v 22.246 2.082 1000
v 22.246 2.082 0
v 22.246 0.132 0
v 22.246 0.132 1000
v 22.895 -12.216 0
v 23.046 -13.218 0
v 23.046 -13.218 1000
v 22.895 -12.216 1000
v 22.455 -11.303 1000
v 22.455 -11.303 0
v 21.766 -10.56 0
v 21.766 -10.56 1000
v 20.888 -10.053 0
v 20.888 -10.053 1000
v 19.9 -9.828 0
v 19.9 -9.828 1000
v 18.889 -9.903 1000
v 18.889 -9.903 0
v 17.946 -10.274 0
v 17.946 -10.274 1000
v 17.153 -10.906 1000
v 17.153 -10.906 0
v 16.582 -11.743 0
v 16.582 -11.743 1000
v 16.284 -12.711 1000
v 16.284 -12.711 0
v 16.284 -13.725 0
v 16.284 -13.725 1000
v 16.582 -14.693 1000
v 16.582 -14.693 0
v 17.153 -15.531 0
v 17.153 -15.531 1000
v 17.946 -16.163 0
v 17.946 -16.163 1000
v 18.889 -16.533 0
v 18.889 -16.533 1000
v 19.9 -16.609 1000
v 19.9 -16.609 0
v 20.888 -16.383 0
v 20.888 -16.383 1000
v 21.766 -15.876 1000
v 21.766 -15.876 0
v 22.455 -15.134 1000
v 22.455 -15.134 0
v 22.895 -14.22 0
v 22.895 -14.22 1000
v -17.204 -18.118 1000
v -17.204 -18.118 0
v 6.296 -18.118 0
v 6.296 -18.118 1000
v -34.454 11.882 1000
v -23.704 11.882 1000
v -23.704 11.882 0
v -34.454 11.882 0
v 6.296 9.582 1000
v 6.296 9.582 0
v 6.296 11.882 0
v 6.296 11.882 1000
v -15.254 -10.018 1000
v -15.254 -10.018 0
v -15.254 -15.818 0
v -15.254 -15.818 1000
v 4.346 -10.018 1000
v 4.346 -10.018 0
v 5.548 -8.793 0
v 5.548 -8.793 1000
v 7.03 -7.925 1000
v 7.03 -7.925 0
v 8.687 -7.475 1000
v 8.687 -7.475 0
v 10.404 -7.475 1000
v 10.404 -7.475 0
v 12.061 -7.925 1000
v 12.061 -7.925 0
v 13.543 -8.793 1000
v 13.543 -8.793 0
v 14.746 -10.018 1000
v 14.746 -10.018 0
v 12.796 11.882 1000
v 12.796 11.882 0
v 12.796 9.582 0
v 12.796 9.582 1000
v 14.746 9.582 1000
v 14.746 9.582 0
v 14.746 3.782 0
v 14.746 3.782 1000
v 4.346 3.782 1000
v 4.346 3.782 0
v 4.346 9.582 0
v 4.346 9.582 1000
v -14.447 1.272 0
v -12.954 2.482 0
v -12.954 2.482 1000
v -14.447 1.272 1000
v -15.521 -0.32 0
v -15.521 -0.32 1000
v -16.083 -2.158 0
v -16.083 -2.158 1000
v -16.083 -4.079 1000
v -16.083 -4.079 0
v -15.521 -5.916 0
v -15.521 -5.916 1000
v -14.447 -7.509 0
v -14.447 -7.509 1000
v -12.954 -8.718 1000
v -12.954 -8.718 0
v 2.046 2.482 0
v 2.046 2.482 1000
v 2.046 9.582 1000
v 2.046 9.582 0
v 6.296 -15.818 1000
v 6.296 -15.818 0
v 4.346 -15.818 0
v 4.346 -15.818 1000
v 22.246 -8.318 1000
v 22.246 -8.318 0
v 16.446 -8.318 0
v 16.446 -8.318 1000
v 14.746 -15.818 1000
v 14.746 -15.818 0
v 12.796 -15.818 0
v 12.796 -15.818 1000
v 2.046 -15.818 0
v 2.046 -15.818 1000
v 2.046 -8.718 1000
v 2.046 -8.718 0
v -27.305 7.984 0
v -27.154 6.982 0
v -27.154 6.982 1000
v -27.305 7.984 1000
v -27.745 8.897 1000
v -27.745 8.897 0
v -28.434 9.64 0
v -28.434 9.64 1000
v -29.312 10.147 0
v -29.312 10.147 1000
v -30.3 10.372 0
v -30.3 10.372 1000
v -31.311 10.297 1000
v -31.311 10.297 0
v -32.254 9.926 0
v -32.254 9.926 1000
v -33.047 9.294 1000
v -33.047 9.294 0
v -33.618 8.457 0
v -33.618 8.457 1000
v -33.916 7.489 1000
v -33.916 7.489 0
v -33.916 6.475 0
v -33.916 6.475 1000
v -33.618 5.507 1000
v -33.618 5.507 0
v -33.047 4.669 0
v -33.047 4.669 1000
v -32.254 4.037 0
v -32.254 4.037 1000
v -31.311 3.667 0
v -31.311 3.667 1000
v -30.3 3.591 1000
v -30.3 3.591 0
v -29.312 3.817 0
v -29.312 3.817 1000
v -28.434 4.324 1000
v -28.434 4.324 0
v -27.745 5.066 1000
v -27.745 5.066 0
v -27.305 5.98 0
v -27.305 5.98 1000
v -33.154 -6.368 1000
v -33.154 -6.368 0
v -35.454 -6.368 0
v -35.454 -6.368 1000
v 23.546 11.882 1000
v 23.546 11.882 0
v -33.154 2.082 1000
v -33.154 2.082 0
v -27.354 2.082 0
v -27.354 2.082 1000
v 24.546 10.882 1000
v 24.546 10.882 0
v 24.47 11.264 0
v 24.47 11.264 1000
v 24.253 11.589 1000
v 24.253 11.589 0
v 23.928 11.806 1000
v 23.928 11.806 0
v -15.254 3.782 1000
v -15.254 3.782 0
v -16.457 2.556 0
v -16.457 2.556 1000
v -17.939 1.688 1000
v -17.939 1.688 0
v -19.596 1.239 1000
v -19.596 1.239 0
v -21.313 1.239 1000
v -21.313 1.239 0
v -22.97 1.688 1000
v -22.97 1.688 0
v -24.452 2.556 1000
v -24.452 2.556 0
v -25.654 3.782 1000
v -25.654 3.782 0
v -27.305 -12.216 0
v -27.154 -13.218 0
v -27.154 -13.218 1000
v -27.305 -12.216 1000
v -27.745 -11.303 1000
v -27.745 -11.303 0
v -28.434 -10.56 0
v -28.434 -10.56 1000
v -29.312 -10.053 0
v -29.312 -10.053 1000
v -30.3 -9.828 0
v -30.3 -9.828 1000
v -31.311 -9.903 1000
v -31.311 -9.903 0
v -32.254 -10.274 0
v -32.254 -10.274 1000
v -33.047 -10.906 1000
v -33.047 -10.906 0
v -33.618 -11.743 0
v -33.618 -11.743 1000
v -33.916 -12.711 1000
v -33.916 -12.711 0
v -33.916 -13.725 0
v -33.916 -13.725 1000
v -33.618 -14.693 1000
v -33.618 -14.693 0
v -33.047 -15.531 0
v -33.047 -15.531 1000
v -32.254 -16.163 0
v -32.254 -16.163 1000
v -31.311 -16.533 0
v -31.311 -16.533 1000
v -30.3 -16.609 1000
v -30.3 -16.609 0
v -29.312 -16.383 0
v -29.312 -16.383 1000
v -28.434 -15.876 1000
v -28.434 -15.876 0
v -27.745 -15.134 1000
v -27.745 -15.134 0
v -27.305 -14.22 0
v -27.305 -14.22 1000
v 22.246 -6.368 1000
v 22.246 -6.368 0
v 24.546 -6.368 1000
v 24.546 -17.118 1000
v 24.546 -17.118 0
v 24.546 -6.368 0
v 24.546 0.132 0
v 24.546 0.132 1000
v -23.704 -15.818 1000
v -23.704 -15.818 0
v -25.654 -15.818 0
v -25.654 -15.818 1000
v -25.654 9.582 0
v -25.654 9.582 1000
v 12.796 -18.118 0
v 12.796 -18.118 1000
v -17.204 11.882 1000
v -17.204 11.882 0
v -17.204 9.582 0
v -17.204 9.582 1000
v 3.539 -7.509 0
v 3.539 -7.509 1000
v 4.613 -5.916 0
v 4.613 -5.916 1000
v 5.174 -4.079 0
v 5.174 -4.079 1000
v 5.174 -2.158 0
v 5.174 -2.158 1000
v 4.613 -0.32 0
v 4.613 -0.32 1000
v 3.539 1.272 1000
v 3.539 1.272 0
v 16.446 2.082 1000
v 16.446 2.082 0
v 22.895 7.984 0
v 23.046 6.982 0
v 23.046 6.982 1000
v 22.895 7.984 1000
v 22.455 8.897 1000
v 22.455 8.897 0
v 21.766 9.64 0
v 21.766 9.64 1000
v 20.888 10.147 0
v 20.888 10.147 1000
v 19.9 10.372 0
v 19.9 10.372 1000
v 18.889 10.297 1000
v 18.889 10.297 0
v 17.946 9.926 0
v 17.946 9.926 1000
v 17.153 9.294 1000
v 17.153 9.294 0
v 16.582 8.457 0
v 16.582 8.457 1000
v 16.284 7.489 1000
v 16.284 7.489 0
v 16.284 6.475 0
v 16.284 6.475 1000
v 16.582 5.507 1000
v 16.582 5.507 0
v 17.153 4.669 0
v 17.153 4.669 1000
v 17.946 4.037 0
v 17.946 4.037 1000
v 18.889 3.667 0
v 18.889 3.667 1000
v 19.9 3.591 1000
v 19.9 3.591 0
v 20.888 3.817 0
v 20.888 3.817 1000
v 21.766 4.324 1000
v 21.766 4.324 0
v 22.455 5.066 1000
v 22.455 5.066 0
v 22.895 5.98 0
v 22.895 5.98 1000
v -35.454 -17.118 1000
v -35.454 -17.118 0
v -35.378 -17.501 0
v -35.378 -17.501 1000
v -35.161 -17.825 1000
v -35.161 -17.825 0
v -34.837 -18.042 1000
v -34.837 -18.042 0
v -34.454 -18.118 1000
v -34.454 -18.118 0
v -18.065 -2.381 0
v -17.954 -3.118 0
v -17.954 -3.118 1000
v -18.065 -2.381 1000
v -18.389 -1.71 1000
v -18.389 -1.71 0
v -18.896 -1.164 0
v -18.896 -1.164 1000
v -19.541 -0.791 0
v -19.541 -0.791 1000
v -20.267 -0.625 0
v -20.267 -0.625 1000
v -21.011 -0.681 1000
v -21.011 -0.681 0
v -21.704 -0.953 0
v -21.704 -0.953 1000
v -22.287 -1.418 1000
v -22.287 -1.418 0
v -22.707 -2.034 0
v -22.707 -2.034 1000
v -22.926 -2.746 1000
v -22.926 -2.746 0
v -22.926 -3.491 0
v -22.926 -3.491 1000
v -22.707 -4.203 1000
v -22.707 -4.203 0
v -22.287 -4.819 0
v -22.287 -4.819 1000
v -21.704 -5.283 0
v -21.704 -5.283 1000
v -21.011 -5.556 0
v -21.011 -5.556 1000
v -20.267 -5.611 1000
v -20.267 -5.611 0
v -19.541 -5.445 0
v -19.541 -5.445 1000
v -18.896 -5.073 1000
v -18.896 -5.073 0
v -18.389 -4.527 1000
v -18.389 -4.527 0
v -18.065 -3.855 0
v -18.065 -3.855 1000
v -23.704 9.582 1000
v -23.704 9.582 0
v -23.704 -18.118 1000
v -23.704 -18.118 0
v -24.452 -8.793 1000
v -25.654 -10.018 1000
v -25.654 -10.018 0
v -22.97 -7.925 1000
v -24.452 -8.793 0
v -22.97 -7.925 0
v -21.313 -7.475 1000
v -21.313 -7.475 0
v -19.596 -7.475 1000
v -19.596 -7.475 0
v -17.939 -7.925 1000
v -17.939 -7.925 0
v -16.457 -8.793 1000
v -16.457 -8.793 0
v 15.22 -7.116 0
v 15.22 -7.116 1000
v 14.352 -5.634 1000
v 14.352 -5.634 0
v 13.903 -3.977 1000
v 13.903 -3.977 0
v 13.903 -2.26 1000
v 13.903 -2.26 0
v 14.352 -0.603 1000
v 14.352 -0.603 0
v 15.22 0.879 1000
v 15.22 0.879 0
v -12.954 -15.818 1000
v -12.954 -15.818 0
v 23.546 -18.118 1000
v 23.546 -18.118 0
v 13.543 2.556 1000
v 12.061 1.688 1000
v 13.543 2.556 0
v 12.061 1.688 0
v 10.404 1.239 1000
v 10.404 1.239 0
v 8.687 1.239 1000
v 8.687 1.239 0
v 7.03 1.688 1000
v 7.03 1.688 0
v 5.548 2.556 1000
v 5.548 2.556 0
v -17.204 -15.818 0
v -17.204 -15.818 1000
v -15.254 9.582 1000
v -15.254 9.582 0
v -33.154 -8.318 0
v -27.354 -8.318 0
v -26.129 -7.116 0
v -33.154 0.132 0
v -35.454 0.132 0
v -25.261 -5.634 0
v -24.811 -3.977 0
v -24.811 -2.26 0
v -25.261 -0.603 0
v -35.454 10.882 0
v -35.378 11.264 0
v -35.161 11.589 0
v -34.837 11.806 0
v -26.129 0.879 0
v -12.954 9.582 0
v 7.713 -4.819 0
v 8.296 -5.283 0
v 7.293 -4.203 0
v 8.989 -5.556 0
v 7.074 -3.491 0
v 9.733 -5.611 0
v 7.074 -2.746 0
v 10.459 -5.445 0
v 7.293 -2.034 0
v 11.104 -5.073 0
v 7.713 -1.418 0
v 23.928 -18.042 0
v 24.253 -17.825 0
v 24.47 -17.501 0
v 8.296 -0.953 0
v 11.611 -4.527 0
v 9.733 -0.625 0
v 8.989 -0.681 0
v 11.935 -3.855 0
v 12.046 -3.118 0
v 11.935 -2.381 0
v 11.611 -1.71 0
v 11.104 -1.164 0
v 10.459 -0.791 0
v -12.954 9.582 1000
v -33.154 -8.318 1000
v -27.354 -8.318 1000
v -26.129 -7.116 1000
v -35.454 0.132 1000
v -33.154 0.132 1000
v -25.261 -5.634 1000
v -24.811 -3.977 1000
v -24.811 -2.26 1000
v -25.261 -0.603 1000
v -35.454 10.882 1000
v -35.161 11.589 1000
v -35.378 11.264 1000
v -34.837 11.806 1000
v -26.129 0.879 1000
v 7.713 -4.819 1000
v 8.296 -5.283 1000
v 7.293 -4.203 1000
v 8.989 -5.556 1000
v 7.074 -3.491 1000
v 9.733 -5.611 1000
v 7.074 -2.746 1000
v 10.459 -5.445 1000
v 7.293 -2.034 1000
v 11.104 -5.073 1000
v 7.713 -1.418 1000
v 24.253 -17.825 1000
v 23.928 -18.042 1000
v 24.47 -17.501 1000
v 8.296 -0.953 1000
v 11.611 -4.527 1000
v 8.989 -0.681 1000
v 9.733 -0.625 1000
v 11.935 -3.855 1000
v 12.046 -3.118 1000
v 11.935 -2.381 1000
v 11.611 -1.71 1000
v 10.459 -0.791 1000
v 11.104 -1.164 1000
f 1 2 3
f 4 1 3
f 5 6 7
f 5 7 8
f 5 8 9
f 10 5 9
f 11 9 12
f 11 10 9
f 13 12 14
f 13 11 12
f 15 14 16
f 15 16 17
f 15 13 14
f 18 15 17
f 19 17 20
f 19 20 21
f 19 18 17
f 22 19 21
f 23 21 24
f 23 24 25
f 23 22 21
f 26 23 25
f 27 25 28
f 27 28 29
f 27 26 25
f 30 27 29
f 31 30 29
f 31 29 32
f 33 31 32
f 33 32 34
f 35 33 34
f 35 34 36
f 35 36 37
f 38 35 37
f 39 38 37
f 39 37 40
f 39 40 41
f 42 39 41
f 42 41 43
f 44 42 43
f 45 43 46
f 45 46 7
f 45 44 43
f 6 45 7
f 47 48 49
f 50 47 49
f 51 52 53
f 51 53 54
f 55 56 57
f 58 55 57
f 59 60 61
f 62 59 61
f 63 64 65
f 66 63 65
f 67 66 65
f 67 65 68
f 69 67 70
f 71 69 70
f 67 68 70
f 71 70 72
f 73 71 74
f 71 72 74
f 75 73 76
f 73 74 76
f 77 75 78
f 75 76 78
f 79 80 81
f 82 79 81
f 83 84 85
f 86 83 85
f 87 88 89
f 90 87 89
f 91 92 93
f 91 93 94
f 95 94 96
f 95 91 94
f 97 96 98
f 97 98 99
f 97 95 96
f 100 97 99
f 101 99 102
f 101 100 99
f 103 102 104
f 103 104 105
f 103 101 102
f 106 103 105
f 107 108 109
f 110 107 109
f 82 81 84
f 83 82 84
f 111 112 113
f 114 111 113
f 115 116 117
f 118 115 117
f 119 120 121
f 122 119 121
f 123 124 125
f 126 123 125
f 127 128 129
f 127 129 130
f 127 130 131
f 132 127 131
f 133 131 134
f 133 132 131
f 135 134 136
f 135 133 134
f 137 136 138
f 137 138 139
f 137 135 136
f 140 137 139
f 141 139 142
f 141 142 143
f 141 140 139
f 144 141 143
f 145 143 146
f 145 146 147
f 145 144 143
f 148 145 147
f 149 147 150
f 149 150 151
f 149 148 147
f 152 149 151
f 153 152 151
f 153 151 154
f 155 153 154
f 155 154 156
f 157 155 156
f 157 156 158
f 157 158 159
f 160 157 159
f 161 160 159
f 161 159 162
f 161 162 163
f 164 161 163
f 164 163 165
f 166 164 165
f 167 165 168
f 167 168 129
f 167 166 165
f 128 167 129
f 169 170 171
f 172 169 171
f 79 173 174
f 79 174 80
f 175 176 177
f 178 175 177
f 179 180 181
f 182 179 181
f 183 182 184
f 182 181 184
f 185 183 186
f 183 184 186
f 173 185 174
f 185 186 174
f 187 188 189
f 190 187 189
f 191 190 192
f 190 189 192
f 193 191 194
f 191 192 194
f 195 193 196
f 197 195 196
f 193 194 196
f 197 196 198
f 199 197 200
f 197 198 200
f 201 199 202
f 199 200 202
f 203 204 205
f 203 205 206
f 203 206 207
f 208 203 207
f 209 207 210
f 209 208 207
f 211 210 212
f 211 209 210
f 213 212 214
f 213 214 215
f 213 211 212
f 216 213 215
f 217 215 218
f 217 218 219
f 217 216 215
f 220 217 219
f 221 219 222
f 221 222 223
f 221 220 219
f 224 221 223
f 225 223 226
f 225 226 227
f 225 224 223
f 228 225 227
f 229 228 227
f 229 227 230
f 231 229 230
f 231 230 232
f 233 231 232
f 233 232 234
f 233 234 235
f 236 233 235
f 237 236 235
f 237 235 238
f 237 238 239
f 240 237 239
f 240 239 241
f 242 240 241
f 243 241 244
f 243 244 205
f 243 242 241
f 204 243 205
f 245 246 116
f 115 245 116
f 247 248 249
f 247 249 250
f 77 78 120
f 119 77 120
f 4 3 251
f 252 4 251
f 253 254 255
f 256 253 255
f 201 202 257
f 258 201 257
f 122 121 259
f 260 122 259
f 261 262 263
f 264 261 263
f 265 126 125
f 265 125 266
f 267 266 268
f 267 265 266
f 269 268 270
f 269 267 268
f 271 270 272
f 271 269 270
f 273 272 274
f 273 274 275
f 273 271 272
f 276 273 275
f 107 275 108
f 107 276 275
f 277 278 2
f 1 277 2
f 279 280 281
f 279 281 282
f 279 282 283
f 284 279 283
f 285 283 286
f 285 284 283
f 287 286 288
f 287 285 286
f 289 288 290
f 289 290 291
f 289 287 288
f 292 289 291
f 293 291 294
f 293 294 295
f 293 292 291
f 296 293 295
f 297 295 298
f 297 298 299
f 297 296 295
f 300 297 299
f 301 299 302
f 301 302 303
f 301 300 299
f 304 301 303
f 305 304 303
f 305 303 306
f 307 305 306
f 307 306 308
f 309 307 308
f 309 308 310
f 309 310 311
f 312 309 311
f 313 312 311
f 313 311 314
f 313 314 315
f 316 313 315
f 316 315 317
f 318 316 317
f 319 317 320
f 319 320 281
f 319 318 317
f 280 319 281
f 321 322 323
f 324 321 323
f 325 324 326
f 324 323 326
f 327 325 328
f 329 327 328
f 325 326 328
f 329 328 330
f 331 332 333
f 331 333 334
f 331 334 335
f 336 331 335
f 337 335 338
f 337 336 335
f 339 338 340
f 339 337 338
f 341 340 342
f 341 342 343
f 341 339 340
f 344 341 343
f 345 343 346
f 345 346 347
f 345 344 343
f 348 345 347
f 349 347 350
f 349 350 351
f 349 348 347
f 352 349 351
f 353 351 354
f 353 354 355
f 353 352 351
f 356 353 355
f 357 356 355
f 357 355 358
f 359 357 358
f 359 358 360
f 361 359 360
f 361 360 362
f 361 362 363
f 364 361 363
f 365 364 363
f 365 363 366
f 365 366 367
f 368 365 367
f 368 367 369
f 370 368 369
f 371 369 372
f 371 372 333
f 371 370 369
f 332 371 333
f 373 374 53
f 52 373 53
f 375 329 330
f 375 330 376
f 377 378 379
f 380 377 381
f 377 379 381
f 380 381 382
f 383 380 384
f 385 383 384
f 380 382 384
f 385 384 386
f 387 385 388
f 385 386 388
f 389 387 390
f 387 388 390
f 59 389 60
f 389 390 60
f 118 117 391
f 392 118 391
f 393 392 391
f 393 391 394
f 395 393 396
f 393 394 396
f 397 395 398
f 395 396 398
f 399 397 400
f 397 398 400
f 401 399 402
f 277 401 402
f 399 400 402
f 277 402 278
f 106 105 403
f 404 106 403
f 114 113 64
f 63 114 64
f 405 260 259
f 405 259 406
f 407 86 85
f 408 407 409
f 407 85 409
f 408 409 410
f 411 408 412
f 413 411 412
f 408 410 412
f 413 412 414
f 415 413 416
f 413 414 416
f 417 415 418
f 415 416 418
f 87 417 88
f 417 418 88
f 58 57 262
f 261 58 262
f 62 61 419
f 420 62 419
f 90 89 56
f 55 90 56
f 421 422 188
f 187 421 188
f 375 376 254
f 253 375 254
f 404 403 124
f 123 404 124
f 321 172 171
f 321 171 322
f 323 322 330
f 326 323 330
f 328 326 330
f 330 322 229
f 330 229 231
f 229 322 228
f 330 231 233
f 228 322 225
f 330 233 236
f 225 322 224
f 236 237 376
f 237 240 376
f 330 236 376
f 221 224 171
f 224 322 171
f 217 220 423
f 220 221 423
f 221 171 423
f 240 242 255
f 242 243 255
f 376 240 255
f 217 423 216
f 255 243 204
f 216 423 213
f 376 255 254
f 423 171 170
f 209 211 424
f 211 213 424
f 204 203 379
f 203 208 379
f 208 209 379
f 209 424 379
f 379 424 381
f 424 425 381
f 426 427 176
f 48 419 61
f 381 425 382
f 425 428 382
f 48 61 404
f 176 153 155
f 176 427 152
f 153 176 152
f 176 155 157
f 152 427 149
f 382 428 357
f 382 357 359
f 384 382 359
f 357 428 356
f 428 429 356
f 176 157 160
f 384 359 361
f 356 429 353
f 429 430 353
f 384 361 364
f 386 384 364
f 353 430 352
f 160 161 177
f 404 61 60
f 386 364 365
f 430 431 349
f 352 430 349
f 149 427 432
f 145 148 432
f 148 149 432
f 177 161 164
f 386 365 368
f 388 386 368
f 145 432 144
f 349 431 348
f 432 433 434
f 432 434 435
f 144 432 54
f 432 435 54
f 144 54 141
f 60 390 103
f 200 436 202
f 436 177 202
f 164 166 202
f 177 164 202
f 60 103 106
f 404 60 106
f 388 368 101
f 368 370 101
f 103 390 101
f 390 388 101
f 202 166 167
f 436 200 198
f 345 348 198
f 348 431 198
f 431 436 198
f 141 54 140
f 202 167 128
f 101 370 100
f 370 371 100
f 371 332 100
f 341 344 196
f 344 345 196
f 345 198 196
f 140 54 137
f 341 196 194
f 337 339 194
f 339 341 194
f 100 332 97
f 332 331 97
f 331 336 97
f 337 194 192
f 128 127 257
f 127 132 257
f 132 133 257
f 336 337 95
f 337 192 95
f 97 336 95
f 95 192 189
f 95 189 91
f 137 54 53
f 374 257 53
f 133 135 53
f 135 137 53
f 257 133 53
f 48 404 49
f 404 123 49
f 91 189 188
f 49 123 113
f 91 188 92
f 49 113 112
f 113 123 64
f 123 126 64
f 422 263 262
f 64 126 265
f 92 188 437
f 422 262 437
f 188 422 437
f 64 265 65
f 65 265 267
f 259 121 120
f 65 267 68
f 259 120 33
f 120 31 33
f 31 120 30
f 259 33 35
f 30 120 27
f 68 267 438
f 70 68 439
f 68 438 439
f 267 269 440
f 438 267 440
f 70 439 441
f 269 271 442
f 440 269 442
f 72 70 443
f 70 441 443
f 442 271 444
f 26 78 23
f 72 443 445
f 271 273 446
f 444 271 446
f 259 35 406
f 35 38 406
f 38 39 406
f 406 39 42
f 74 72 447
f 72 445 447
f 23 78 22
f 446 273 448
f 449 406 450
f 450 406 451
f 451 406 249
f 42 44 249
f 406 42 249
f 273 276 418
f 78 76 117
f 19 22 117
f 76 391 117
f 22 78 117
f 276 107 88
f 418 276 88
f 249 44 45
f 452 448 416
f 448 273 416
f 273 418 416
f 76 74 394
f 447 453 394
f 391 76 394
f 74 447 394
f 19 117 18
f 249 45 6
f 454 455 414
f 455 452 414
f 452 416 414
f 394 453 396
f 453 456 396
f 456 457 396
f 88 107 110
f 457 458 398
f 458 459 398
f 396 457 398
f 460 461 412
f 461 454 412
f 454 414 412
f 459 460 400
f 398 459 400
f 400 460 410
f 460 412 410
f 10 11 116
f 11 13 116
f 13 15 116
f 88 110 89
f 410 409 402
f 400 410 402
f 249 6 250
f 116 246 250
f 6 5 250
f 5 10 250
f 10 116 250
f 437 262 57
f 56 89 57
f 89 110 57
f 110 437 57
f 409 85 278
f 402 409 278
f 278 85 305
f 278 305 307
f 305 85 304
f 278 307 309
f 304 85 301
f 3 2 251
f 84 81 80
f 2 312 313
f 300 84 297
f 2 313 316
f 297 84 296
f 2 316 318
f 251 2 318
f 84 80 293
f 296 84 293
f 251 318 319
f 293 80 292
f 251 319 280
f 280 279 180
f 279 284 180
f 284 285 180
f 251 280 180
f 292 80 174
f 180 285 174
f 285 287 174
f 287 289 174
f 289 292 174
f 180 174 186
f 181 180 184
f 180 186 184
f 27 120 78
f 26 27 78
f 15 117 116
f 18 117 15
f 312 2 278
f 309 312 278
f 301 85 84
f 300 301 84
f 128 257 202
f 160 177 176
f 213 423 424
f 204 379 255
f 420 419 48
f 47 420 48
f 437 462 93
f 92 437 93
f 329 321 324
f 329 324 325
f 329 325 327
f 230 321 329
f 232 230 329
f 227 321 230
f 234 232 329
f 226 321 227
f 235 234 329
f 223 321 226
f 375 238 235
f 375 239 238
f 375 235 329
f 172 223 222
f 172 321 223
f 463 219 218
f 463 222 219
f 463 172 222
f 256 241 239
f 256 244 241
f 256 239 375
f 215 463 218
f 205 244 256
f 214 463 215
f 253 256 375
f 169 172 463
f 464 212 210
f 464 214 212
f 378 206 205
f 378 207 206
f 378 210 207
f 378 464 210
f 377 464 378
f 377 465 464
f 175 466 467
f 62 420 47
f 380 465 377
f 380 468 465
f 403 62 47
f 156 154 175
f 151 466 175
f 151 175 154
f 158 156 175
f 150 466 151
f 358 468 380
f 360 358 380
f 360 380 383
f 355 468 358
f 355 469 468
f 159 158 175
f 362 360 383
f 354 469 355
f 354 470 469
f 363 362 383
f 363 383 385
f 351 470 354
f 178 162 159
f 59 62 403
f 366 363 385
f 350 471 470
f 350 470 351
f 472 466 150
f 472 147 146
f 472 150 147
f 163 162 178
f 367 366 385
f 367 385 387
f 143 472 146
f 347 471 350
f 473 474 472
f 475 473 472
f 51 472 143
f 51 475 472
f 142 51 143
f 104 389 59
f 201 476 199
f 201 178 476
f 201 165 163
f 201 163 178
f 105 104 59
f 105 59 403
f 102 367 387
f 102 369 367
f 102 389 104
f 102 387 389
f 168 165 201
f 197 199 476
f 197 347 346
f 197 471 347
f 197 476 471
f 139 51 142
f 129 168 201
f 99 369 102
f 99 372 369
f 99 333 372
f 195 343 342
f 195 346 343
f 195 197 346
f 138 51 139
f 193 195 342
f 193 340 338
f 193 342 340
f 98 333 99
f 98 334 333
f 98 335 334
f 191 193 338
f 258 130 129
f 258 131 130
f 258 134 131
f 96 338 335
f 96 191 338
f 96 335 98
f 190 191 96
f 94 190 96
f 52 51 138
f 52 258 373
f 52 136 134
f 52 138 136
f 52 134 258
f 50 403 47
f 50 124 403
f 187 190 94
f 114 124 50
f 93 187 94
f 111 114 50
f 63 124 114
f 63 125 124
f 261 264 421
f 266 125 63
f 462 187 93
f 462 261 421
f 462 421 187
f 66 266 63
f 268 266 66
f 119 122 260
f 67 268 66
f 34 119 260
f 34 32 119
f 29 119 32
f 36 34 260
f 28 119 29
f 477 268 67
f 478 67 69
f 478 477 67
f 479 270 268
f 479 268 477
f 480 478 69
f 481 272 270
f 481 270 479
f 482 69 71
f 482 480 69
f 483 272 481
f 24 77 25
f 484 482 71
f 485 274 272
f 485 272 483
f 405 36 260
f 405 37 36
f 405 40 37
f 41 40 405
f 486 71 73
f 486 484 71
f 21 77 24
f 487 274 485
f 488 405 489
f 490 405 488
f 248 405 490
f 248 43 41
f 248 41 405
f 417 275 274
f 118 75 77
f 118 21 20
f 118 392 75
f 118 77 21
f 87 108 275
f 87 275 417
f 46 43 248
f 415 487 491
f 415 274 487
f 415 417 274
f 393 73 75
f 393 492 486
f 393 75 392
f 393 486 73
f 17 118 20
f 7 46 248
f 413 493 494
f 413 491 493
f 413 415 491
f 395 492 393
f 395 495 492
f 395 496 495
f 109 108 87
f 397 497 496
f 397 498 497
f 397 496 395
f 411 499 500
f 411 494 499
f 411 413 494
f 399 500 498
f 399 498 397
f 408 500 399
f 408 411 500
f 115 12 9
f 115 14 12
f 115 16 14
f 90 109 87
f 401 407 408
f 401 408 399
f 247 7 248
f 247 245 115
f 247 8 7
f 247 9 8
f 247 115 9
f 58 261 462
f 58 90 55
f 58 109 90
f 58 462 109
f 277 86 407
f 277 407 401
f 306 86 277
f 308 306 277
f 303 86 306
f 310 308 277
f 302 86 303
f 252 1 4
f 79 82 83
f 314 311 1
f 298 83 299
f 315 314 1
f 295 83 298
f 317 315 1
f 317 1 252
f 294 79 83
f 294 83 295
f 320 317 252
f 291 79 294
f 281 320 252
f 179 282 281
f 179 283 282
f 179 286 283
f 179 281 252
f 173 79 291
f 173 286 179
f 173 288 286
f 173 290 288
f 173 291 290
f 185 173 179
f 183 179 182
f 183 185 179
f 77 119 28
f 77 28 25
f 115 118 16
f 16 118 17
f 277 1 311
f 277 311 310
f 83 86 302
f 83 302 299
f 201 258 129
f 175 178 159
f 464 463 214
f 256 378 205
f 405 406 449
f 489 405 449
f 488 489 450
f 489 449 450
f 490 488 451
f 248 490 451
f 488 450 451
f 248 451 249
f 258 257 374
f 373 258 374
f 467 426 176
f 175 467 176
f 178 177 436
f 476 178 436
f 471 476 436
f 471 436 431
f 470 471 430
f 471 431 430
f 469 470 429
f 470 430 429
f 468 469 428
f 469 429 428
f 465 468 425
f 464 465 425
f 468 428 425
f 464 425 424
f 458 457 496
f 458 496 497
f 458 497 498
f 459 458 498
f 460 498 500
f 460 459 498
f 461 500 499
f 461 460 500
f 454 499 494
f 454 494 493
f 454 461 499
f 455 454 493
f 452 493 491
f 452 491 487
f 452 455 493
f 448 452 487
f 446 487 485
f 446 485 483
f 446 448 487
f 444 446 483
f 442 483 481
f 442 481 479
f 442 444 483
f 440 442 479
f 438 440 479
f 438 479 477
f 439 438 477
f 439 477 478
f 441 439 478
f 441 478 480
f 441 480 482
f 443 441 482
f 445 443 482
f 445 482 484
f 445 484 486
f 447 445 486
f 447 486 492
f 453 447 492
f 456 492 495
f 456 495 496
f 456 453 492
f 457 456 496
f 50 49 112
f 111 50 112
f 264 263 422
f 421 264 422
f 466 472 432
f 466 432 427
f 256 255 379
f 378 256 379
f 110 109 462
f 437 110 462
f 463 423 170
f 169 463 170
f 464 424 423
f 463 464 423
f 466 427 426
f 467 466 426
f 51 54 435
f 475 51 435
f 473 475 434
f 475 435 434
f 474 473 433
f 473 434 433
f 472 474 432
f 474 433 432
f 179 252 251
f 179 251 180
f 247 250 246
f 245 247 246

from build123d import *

# Parameters (mm, degrees)
SKETCH_1_R      = 2.5
SKETCH_1_R_2    = 3.4
EXTRUDE_1_DEPTH = 1000


with BuildPart() as part:
    # 草图1 → 凸台-拉伸1 (new body)
    with BuildSketch(Plane.XY):
        with BuildLine():
            Line((-17.204286219, -18.118225585), (6.295713781, -18.118225585))
            Line((6.295713781, -18.118225585), (6.295713781, -15.818225585))
            Line((6.295713781, -15.818225585), (4.345713781, -15.818225585))
            Line((4.345713781, -15.818225585), (4.345713781, -10.018225585))
            ThreePointArc((4.345713781, -10.018225585), (9.545713781, -7.418225585), (14.745713781, -10.018225585))
            Line((14.745713781, -10.018225585), (14.745713781, -15.818225585))
            Line((14.745713781, -15.818225585), (12.795713781, -15.818225585))
            Line((12.795713781, -15.818225585), (12.795713781, -18.118225585))
            Line((12.795713781, -18.118225585), (23.545713781, -18.118225585))
            ThreePointArc((23.545713781, -18.118225585), (24.252820562, -17.825332366), (24.545713781, -17.118225585))
            Line((24.545713781, -17.118225585), (24.545713781, -6.368225585))
            Line((24.545713781, -6.368225585), (22.245713781, -6.368225585))
            Line((22.245713781, -6.368225585), (22.245713781, -8.318225585))
            Line((22.245713781, -8.318225585), (16.445713781, -8.318225585))
            ThreePointArc((16.445713781, -8.318225585), (13.845713781, -3.118225585), (16.445713781, 2.081774415))
            Line((16.445713781, 2.081774415), (22.245713781, 2.081774415))
            Line((22.245713781, 2.081774415), (22.245713781, 0.131774415))
            Line((22.245713781, 0.131774415), (24.545713781, 0.131774415))
            Line((24.545713781, 0.131774415), (24.545713781, 10.881774415))
            ThreePointArc((24.545713781, 10.881774415), (24.252820562, 11.588881197), (23.545713781, 11.881774415))
            Line((23.545713781, 11.881774415), (12.795713781, 11.881774415))
            Line((12.795713781, 11.881774415), (12.795713781, 9.581774415))
            Line((12.795713781, 9.581774415), (14.745713781, 9.581774415))
            Line((14.745713781, 9.581774415), (14.745713781, 3.781774415))
            ThreePointArc((14.745713781, 3.781774415), (9.545713781, 1.181774415), (4.345713781, 3.781774415))
            Line((4.345713781, 3.781774415), (4.345713781, 9.581774415))
            Line((4.345713781, 9.581774415), (6.295713781, 9.581774415))
            Line((6.295713781, 9.581774415), (6.295713781, 11.881774415))
            Line((6.295713781, 11.881774415), (-17.204286219, 11.881774415))
            Line((-17.204286219, 11.881774415), (-17.204286219, 9.581774415))
            Line((-17.204286219, 9.581774415), (-15.254286219, 9.581774415))
            Line((-15.254286219, 9.581774415), (-15.254286219, 3.781774415))
            ThreePointArc((-15.254286219, 3.781774415), (-20.454286219, 1.181774415), (-25.654286219, 3.781774415))
            Line((-25.654286219, 3.781774415), (-25.654286219, 9.581774415))
            Line((-25.654286219, 9.581774415), (-23.704286219, 9.581774415))
            Line((-23.704286219, 9.581774415), (-23.704286219, 11.881774415))
            Line((-23.704286219, 11.881774415), (-34.454286219, 11.881774415))
            ThreePointArc((-34.454286219, 11.881774415), (-35.161393, 11.588881197), (-35.454286219, 10.881774415))
            Line((-35.454286219, 10.881774415), (-35.454286219, 0.131774415))
            Line((-35.454286219, 0.131774415), (-33.154286219, 0.131774415))
            Line((-33.154286219, 0.131774415), (-33.154286219, 2.081774415))
            Line((-33.154286219, 2.081774415), (-27.354286219, 2.081774415))
            ThreePointArc((-27.354286219, 2.081774415), (-24.754286219, -3.118225585), (-27.354286219, -8.318225585))
            Line((-27.354286219, -8.318225585), (-33.154286219, -8.318225585))
            Line((-33.154286219, -8.318225585), (-33.154286219, -6.368225585))
            Line((-33.154286219, -6.368225585), (-35.454286219, -6.368225585))
            Line((-35.454286219, -6.368225585), (-35.454286219, -17.118225585))
            ThreePointArc((-35.454286219, -17.118225585), (-35.161393, -17.825332366), (-34.454286219, -18.118225585))
            Line((-34.454286219, -18.118225585), (-23.704286219, -18.118225585))
            Line((-23.704286219, -18.118225585), (-23.704286219, -15.818225585))
            Line((-23.704286219, -15.818225585), (-25.654286219, -15.818225585))
            Line((-25.654286219, -15.818225585), (-25.654286219, -10.018225585))
            ThreePointArc((-25.654286219, -10.018225585), (-20.454286219, -7.418225585), (-15.254286219, -10.018225585))
            Line((-15.254286219, -10.018225585), (-15.254286219, -15.818225585))
            Line((-15.254286219, -15.818225585), (-17.204286219, -15.818225585))
            Line((-17.204286219, -15.818225585), (-17.204286219, -18.118225585))
        make_face()
        with Locations((-20.454286219, -3.118225585)):
            Circle(SKETCH_1_R, mode=Mode.SUBTRACT)
        with Locations((-30.554286219, -13.218225585)):
            Circle(SKETCH_1_R_2, mode=Mode.SUBTRACT)
        with Locations((-30.554286219, 6.981774415)):
            Circle(SKETCH_1_R_2, mode=Mode.SUBTRACT)
        with Locations((19.645713781, -13.218225585)):
            Circle(SKETCH_1_R_2, mode=Mode.SUBTRACT)
        with Locations((19.645713781, 6.981774415)):
            Circle(SKETCH_1_R_2, mode=Mode.SUBTRACT)
        with Locations((9.545713781, -3.118225585)):
            Circle(SKETCH_1_R, mode=Mode.SUBTRACT)
        with BuildLine():
            Line((2.045713781, -15.818225585), (2.045713781, -8.718225585))
            ThreePointArc((2.045713781, -8.718225585), (5.245713781, -3.118225585), (2.045713781, 2.481774415))
            Line((2.045713781, 2.481774415), (2.045713781, 9.581774415))
            Line((2.045713781, 9.581774415), (-12.954286219, 9.581774415))
            Line((-12.954286219, 9.581774415), (-12.954286219, 2.481774415))
            ThreePointArc((-12.954286219, 2.481774415), (-16.154286219, -3.118225585), (-12.954286219, -8.718225585))
            Line((-12.954286219, -8.718225585), (-12.954286219, -15.818225585))
            Line((-12.954286219, -15.818225585), (2.045713781, -15.818225585))
        make_face(mode=Mode.SUBTRACT)
    extrude(amount=EXTRUDE_1_DEPTH)


solid = part.part
